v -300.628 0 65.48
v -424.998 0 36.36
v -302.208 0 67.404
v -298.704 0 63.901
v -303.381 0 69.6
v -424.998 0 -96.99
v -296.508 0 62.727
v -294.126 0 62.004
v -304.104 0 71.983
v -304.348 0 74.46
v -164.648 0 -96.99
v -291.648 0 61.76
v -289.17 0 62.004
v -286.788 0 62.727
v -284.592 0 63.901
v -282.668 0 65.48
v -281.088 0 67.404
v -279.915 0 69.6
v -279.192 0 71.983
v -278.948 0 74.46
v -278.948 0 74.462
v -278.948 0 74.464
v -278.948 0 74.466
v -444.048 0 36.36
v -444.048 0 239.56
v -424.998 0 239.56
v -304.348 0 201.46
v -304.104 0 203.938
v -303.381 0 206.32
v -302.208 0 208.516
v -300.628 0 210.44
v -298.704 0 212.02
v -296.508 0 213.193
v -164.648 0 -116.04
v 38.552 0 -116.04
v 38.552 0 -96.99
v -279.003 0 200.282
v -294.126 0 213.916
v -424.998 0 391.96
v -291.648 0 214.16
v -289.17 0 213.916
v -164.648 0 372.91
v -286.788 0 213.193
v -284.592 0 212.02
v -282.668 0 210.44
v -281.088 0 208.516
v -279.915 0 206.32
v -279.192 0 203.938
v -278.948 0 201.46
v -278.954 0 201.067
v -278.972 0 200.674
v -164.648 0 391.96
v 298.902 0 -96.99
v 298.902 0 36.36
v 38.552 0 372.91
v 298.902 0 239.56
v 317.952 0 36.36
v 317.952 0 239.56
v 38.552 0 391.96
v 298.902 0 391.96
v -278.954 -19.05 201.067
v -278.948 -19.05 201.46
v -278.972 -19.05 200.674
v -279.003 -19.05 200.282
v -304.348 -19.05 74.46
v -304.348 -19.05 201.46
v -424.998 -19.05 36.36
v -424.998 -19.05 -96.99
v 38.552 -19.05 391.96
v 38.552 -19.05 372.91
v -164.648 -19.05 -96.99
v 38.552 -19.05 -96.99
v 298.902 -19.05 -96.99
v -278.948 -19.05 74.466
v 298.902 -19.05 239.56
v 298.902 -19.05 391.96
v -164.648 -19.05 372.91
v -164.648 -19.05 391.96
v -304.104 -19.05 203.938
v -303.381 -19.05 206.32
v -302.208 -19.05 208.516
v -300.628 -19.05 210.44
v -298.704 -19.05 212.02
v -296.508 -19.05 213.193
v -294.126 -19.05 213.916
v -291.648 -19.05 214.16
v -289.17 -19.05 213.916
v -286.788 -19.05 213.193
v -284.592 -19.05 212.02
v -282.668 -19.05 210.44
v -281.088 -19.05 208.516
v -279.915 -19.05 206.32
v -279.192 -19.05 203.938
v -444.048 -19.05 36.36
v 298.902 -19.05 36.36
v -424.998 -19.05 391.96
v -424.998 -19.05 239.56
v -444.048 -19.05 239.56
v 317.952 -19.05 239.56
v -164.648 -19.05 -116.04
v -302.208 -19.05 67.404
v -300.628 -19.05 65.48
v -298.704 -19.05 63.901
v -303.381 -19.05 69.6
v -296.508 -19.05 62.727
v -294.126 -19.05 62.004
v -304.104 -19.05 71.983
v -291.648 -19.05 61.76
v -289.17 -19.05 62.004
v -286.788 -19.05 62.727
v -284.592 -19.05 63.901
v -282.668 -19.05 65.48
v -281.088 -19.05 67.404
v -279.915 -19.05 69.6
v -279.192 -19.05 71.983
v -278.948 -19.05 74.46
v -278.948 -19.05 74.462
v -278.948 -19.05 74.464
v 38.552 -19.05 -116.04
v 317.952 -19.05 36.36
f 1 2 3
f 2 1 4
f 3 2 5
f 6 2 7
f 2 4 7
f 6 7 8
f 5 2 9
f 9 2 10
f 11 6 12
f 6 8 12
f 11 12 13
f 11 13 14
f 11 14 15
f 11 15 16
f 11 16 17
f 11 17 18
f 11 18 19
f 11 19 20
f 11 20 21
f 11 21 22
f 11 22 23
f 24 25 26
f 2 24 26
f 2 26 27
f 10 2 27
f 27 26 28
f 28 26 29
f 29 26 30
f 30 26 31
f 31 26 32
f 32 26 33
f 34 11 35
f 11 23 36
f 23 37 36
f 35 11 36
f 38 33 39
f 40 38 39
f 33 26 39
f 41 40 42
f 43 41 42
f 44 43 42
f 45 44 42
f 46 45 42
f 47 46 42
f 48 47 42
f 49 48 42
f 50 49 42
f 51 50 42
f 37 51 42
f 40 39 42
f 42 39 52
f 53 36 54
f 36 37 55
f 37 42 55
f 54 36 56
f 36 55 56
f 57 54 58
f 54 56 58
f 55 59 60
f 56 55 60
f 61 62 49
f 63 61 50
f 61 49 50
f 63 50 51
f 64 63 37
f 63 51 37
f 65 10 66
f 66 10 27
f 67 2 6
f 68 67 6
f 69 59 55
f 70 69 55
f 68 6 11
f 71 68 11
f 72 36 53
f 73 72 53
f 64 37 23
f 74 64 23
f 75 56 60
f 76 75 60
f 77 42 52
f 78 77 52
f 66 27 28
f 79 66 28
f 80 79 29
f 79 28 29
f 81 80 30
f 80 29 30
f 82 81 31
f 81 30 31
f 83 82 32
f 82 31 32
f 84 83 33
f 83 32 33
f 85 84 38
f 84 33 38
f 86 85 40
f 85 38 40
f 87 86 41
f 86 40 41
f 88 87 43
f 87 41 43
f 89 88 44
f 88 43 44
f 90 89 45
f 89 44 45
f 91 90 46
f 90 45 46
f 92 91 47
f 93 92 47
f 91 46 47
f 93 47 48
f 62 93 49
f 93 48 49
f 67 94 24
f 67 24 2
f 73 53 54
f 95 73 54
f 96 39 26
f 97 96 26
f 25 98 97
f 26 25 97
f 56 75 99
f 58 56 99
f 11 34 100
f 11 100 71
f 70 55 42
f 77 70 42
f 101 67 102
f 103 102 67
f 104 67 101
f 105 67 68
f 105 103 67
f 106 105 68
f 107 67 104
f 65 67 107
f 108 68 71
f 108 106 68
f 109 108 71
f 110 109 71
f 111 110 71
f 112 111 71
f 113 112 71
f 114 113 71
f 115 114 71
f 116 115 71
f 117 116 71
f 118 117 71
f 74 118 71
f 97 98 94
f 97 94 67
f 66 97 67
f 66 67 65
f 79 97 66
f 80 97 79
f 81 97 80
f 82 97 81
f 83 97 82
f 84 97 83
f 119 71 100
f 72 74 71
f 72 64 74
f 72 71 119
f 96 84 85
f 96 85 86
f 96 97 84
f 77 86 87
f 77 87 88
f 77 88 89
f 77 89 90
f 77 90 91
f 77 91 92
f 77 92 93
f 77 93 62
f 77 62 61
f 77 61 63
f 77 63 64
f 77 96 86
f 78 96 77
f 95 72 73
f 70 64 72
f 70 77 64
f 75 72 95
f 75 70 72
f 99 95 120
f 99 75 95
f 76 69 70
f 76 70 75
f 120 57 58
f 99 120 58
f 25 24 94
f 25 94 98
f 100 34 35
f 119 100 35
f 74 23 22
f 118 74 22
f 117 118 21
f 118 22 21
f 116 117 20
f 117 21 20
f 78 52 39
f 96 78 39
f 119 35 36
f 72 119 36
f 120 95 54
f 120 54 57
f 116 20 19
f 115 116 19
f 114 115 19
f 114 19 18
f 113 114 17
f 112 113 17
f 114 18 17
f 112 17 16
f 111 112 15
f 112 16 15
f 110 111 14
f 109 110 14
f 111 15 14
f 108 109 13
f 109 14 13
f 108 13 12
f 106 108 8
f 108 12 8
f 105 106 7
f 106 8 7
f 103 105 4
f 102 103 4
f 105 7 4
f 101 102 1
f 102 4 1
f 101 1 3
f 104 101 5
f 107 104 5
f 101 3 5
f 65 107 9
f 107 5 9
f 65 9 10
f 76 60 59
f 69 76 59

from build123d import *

# Parameters (mm, degrees)
F0_W     = 19.05
F0_H     = 203.2
F0_W_2   = 203.2
F0_H_2   = 19.05
F1_DEPTH = 19.05


with BuildPart() as f1:
    # F0 (on Front) → F1 (new body)
    with BuildSketch(Plane.XZ):
        with Locations((-434.523107, 137.960202)):
            Rectangle(F0_W, F0_H)
        Polygon((-164.648107, 391.960202), (-424.998107, 391.960202), (-424.998107, 239.560202), (-424.998107, 36.360202), (-424.998107, -96.989798), (-164.648107, -96.989798), (38.551893, -96.989798), (298.901893, -96.989798), (298.901893, 36.360202), (298.901893, 239.560202), (298.901893, 391.960202), (38.551893, 391.960202), (38.551893, 372.910202), (-164.648107, 372.910202), align=None)
        with BuildLine():
            ThreePointArc((-304.348107, 201.460202), (-291.648107, 214.160202), (-278.948107, 201.460202))
            ThreePointArc((-278.948107, 201.460202), (-278.961817, 200.870249), (-279.002917, 200.28157))
            Line((-279.002917, 200.28157), (-278.948108, 74.465734))
            ThreePointArc((-278.948108, 74.465734), (-278.948107, 74.462968), (-278.948107, 74.460202))
            ThreePointArc((-278.948107, 74.460202), (-291.648107, 61.760202), (-304.348107, 74.460202))
            Line((-304.348107, 74.460202), (-304.348107, 201.460202))
        make_face(mode=Mode.SUBTRACT)
        with Locations((308.426893, 137.960202)):
            Rectangle(F0_W, F0_H)
        with Locations((-63.048107, -106.514798)):
            Rectangle(F0_W_2, F0_H_2)
    extrude(amount=F1_DEPTH)


solid = f1.part
